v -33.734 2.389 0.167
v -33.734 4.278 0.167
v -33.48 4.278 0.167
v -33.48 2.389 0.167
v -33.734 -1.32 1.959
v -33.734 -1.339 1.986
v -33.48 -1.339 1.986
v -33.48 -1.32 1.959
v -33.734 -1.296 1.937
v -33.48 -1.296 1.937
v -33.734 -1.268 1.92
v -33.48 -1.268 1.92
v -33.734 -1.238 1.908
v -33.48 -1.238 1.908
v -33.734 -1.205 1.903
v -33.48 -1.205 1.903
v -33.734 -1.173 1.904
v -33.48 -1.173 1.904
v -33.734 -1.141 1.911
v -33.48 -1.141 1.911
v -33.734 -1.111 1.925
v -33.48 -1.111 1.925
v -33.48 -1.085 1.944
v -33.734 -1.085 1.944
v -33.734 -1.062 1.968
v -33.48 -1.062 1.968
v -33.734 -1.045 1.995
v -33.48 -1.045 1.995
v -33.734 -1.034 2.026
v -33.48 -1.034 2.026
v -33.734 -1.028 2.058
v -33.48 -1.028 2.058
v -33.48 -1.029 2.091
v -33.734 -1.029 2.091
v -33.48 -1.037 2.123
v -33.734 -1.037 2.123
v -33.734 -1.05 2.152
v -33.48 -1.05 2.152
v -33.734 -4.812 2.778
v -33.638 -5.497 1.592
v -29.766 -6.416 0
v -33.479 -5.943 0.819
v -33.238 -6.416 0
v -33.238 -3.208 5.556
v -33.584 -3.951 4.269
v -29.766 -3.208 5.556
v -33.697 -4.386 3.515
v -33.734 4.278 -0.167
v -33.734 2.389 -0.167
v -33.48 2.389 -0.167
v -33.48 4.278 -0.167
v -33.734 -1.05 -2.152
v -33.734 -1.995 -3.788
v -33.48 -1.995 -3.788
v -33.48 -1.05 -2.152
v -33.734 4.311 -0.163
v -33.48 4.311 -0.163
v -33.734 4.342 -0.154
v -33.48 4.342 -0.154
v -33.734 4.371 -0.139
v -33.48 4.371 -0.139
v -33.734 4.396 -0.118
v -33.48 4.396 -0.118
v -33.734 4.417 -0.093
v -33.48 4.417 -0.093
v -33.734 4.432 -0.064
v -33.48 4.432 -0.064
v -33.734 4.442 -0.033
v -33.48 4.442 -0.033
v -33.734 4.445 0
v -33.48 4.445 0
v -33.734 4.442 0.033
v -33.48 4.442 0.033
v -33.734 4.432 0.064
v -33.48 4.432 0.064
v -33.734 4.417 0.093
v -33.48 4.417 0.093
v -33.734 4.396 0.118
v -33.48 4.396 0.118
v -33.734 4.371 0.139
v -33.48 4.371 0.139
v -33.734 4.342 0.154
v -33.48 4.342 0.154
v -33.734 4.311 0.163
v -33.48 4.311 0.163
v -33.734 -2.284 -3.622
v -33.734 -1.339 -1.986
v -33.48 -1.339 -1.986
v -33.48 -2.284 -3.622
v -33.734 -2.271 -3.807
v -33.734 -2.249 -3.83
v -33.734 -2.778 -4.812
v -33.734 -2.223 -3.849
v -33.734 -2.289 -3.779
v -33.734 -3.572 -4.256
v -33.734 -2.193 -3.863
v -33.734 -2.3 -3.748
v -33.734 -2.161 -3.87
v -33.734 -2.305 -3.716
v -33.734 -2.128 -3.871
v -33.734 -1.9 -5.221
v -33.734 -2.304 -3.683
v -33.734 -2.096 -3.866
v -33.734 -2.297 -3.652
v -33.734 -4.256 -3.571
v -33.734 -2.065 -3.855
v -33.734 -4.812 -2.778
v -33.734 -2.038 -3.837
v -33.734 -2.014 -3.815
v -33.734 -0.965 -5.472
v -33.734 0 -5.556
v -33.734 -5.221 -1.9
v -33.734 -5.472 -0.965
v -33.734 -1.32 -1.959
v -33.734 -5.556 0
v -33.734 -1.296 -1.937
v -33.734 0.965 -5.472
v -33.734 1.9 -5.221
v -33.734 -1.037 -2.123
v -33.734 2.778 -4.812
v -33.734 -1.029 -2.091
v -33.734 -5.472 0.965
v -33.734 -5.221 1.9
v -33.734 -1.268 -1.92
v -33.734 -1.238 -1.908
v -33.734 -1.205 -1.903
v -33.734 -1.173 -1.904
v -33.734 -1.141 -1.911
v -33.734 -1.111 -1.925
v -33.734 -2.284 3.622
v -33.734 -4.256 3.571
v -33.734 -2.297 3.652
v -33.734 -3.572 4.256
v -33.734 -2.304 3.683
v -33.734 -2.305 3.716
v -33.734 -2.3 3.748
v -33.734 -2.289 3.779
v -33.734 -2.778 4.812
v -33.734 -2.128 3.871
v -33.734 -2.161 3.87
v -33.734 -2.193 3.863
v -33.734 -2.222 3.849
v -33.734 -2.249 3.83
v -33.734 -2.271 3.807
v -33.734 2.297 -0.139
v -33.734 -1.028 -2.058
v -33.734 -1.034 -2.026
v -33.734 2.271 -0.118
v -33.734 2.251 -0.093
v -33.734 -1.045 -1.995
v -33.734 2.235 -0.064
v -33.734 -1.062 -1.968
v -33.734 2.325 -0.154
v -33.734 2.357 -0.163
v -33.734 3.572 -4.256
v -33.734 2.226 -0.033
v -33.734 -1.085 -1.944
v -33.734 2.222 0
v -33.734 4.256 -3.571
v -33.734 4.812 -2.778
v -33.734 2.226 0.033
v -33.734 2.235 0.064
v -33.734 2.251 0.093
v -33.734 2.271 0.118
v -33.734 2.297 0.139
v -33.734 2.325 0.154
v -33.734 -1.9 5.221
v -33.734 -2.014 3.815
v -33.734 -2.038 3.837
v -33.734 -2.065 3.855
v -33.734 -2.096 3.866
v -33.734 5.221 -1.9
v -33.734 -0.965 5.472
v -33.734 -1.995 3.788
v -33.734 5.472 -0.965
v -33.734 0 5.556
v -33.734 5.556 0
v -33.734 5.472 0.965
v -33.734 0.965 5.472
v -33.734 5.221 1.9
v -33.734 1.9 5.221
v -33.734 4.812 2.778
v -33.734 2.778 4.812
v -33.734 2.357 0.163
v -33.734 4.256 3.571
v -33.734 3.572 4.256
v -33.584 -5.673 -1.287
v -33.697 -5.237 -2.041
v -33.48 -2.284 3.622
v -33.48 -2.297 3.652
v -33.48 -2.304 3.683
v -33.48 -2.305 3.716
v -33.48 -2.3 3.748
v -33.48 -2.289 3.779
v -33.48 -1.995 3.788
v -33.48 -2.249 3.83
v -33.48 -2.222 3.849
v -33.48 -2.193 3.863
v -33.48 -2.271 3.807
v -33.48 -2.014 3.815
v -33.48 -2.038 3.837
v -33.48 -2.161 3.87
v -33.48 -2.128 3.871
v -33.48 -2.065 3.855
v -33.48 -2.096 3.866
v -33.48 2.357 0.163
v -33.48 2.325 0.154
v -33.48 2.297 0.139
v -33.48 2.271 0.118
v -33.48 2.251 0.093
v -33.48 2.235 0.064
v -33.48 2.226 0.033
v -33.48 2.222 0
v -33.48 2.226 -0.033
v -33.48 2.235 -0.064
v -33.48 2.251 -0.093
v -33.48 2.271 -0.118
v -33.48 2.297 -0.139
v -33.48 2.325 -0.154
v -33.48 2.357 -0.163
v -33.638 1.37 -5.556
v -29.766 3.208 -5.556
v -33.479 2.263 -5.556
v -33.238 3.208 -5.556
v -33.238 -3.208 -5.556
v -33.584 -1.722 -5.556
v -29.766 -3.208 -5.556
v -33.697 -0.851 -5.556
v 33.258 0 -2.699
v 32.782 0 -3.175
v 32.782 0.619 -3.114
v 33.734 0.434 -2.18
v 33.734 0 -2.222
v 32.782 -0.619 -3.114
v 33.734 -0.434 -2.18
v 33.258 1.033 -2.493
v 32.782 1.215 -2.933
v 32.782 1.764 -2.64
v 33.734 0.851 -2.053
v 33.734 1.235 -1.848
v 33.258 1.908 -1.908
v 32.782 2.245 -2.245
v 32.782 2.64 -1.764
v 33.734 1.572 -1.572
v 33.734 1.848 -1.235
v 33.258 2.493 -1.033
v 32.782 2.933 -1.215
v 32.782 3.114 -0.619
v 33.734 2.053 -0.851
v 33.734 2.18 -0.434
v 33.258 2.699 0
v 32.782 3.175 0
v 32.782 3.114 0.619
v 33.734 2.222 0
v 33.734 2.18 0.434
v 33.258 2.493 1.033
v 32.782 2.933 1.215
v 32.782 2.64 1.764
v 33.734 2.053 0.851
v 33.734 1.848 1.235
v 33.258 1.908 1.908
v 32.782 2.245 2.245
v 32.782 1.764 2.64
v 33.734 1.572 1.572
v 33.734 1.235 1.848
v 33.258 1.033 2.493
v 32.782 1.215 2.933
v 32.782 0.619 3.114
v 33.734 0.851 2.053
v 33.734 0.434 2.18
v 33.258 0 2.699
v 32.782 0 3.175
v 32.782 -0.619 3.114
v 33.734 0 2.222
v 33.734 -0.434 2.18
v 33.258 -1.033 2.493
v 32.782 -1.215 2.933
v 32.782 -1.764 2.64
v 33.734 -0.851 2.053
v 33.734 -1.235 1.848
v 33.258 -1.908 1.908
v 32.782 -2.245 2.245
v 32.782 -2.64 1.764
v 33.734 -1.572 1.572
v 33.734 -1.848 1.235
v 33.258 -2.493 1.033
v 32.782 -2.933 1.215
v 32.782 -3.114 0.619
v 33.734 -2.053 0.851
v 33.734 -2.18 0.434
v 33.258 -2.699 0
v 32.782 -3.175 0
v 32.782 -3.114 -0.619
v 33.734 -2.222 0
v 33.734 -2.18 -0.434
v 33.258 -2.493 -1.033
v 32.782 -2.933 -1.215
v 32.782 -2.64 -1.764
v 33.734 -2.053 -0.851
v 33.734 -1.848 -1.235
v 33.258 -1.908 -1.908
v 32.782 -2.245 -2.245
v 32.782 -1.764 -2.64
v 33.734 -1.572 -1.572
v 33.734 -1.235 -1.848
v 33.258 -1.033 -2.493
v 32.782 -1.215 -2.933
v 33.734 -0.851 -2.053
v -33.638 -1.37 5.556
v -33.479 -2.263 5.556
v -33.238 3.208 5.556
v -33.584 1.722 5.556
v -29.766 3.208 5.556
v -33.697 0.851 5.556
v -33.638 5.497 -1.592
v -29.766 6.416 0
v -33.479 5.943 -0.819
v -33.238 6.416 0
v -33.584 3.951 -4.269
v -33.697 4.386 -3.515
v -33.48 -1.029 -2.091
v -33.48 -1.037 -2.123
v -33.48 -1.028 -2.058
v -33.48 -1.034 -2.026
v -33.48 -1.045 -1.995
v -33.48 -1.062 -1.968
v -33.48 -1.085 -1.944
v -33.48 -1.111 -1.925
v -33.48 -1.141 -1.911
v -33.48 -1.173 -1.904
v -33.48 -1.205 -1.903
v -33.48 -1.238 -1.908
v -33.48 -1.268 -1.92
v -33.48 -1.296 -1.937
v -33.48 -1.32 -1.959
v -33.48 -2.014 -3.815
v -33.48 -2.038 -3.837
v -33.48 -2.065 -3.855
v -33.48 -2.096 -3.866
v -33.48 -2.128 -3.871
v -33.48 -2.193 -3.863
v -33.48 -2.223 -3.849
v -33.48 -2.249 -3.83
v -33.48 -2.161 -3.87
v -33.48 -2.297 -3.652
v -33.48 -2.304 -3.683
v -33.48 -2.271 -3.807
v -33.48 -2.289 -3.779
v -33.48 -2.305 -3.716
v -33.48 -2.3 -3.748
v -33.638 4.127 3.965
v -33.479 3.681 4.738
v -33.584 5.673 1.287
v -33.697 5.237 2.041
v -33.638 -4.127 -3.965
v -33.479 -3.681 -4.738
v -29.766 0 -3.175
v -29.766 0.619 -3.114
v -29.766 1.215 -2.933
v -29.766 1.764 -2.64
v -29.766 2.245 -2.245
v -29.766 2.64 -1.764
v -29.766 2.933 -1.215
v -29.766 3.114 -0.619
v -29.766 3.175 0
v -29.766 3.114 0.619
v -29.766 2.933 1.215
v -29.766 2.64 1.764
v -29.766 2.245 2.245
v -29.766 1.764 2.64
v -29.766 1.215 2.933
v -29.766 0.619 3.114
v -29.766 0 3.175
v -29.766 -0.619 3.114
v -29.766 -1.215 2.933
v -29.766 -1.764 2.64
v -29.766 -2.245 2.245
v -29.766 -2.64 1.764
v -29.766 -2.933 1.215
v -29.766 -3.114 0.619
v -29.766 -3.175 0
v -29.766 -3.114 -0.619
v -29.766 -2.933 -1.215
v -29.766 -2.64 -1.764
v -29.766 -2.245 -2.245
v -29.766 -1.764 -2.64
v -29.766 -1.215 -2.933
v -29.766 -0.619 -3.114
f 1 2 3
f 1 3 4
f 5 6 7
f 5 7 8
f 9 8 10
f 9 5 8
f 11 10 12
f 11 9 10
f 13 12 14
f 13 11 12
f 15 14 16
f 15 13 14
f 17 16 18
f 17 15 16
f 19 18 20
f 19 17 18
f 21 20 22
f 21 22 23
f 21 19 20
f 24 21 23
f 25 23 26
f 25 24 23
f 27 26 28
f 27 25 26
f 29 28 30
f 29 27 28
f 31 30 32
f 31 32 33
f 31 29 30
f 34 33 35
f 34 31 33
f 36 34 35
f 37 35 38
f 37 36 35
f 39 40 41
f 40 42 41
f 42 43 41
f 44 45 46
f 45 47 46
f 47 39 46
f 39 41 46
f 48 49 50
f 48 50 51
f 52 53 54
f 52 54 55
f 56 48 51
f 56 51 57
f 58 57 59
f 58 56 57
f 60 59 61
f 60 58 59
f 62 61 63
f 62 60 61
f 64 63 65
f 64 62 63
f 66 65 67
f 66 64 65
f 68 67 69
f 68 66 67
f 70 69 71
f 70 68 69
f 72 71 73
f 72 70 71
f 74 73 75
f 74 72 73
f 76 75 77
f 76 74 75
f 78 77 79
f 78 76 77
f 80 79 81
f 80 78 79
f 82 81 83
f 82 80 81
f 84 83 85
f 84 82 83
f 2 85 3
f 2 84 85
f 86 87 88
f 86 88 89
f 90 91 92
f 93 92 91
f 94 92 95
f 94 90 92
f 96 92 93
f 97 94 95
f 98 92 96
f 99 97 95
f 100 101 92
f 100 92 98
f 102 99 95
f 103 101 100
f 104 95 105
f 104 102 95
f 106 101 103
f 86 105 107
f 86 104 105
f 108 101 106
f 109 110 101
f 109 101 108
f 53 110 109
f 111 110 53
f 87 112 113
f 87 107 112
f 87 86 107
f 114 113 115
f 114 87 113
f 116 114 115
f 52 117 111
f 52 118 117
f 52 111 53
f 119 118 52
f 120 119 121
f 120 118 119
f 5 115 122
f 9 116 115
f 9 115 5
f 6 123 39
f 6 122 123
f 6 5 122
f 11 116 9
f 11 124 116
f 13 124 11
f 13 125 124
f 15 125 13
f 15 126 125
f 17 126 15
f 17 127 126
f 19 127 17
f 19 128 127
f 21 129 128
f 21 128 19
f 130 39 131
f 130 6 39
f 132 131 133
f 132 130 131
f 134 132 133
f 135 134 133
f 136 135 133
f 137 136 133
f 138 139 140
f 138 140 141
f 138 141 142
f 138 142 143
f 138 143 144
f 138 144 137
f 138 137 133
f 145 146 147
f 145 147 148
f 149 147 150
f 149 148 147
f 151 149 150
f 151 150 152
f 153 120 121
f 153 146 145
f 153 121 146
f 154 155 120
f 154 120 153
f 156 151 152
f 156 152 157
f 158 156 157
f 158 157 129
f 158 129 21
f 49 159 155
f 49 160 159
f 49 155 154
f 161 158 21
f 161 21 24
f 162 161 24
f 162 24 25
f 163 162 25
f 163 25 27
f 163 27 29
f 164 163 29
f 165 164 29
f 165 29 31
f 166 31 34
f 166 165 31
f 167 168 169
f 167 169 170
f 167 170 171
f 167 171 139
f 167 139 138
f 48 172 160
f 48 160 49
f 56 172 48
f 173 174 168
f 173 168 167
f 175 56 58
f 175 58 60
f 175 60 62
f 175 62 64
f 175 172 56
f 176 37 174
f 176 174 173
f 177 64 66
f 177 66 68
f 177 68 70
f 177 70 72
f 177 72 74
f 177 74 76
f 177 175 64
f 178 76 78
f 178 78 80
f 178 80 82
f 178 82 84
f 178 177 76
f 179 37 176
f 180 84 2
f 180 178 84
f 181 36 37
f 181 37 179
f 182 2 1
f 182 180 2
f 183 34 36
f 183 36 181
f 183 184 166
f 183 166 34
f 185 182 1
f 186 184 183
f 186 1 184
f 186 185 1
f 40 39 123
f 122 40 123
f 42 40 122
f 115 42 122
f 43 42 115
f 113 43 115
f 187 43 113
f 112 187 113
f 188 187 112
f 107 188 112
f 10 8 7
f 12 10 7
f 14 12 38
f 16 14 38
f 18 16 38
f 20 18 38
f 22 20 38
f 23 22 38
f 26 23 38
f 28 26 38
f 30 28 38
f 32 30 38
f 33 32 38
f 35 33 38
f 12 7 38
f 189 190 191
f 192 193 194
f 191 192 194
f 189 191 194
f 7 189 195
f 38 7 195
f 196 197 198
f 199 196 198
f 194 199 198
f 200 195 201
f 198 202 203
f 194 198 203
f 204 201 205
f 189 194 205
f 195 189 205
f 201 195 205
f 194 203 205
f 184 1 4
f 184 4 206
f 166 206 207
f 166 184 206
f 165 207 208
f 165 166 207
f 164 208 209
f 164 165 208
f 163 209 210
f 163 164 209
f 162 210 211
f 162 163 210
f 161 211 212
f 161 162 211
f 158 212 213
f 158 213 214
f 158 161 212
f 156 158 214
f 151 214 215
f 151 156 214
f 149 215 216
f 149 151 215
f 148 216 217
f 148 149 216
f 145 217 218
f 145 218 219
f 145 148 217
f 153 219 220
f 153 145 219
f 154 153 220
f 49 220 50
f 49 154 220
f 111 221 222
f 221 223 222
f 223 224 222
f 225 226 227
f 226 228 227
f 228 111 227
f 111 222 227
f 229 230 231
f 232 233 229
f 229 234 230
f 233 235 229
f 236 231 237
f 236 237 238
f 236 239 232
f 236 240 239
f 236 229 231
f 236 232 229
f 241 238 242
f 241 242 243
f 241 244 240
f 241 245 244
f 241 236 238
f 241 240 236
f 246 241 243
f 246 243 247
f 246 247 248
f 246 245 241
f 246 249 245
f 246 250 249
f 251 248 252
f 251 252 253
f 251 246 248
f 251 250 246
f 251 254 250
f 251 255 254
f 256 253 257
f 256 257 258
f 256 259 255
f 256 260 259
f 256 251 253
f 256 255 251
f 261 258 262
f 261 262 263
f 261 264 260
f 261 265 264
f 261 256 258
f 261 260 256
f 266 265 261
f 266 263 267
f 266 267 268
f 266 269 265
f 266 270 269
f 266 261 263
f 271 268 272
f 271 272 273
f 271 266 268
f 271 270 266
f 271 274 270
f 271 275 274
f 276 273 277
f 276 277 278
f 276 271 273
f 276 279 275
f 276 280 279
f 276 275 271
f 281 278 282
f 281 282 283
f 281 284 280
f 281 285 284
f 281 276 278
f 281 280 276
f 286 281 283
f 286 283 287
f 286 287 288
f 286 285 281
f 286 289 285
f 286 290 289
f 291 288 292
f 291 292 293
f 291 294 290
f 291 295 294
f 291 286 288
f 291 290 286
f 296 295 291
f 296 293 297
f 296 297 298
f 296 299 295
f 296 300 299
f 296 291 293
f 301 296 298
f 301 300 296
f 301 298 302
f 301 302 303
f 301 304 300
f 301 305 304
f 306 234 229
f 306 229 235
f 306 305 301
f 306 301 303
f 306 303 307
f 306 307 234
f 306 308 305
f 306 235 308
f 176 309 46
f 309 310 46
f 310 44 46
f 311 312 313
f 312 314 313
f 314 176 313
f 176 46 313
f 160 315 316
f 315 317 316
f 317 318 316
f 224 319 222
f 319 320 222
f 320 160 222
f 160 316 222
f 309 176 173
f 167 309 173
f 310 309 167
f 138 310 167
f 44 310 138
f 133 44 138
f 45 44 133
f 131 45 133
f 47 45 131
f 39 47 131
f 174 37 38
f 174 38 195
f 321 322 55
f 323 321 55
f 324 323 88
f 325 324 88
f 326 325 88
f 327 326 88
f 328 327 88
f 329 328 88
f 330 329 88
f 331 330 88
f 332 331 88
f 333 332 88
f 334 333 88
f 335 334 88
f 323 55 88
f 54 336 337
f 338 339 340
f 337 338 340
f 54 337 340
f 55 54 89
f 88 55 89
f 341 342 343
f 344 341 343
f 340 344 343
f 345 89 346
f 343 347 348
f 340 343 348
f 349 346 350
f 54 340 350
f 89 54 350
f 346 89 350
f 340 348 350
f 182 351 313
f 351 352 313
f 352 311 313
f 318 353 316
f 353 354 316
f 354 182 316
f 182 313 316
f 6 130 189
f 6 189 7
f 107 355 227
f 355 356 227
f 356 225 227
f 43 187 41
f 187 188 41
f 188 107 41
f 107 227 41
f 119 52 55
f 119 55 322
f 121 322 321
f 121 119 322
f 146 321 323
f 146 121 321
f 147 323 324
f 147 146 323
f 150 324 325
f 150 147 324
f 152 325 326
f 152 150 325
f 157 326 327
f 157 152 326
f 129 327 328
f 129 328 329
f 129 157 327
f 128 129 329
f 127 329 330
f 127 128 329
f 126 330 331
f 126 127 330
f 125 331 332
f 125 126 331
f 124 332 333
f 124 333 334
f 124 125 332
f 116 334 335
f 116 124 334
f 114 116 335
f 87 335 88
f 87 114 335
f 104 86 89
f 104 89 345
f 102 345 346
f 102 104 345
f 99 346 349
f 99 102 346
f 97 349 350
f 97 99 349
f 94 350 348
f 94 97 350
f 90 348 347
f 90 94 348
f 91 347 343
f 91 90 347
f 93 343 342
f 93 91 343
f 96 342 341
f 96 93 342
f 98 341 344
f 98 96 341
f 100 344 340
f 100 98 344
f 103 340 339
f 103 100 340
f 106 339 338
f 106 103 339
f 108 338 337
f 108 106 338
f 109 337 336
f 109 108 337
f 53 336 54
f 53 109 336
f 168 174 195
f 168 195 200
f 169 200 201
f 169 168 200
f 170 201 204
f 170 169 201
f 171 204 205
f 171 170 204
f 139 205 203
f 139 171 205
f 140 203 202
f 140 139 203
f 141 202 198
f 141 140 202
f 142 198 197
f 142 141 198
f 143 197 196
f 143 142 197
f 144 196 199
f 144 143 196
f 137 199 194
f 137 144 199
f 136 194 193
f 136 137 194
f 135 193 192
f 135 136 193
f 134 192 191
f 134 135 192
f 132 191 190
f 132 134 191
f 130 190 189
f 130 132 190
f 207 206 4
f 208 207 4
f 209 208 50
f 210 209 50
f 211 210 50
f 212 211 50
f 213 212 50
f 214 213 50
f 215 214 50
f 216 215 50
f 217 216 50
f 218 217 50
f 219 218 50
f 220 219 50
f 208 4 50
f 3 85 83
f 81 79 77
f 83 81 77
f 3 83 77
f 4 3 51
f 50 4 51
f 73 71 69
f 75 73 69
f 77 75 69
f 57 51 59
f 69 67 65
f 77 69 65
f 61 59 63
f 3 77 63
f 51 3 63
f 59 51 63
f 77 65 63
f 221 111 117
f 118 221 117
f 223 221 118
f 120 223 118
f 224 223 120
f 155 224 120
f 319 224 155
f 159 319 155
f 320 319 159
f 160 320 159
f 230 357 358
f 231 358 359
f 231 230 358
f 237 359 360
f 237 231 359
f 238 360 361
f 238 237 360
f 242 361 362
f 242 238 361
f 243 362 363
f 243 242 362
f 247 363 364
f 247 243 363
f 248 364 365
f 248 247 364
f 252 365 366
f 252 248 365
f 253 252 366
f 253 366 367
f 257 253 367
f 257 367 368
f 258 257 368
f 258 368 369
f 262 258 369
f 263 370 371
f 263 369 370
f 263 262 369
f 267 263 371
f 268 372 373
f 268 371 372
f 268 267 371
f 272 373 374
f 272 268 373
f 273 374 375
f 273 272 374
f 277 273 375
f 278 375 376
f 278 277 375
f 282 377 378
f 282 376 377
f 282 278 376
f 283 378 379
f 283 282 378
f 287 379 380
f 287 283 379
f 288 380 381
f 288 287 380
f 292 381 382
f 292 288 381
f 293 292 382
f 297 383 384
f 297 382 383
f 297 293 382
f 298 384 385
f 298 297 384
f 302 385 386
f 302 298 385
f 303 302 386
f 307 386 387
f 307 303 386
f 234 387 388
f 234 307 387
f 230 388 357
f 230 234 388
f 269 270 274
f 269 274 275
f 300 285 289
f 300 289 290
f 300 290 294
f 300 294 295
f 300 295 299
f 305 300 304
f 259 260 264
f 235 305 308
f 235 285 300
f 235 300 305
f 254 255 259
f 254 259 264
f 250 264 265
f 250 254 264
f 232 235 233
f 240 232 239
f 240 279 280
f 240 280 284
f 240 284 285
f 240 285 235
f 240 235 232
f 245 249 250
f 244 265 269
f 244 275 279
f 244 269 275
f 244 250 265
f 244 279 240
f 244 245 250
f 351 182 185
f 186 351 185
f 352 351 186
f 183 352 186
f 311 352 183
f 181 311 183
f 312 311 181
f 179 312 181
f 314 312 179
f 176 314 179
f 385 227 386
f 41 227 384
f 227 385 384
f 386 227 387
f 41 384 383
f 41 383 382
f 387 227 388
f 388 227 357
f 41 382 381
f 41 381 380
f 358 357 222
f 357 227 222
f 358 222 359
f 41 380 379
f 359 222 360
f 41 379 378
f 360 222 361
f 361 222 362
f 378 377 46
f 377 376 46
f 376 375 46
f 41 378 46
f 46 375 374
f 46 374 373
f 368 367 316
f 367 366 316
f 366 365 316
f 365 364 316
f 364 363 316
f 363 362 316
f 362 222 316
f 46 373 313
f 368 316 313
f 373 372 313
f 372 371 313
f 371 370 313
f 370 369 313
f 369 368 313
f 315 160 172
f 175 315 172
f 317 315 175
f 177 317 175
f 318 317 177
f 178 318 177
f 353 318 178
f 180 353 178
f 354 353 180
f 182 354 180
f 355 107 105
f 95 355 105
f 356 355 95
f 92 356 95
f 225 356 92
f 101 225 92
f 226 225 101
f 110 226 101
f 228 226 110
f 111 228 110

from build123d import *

# Parameters (mm, degrees)
SKETCH5_R           = 3.175
BOSS_EXTRUDE3_DEPTH = 63.5
CHAMFER1_SIZE       = 0.9525
BOSS_EXTRUDE4_DEPTH = 3.96875
SKETCH8_OUTSIDE_W   = 264.208
SKETCH8_OUTSIDE_H   = 265.928
SKETCH8_OUTSIDE_R   = 5.55625
CUT_EXTRUDE3_DEPTH  = 68.46875
CUT_EXTRUDE3_TAPER  = 60
CUT_EXTRUDE4_DEPTH  = 0.254
CIRPATTERN1_COUNT   = 3


with BuildPart() as part:
    # Sketch5 → Boss-Extrude3 (new body)
    with BuildSketch(Plane(origin=(33.734375, 0, 0), x_dir=(0, 0, -1), z_dir=(1, 0, 0))):
        Circle(SKETCH5_R)
    extrude(amount=-BOSS_EXTRUDE3_DEPTH)

    # Chamfer1
    chamfer1_edges = [part.edges().sort_by_distance(p)[0] for p in [
        (33.734375, 0, 3.175),
    ]]
    chamfer(chamfer1_edges, length=CHAMFER1_SIZE)

    # Sketch11 → Revolve1 (revolve)
    with BuildSketch(Plane.XY):
        Polygon((-29.765625, 3.175), (-29.765625, 0), (17.859375, 0), (14.684375, 3.175), align=None)
    revolve(axis=Axis((-29.765625, 0, 0), (1, 0, 0)))

    # Sketch6 → Boss-Extrude4 (add)
    with BuildSketch(Plane.ZY.offset(29.765625)):
        Polygon((5.55625, 3.207902433), (0, 6.415804866), (-5.55625, 3.207902433), (-5.55625, -3.207902433), (0, -6.415804866), (5.55625, -3.207902433), align=None)
    extrude(amount=BOSS_EXTRUDE4_DEPTH)

    # Sketch8 outside → Cut-Extrude3 (cut, through all)
    with BuildSketch(Plane.ZY.offset(33.734375)):
        Rectangle(SKETCH8_OUTSIDE_W, SKETCH8_OUTSIDE_H)
        Circle(SKETCH8_OUTSIDE_R, mode=Mode.SUBTRACT)
    extrude(amount=-CUT_EXTRUDE3_DEPTH, taper=CUT_EXTRUDE3_TAPER, mode=Mode.SUBTRACT)

    # Sketch12 → Cut-Extrude4 (cut)
    with BuildSketch(Plane.ZY.offset(33.734375)):
        with BuildLine():
            Line((0.1666875, 4.2783125), (0.1666875, 2.3891875))
            ThreePointArc((0.1666875, 2.3891875), (0, 2.2225), (-0.1666875, 2.3891875))
            Line((-0.1666875, 2.3891875), (-0.1666875, 4.2783125))
            ThreePointArc((-0.1666875, 4.2783125), (0, 4.445), (0.1666875, 4.2783125))
        make_face()
    cut_extrude4 = extrude(amount=-CUT_EXTRUDE4_DEPTH, mode=Mode.SUBTRACT)

    # CirPattern1: Cut-Extrude4 ×3 about axis
    cirpattern1_axis = Axis((0, 0, 0), (1, 0, 0))
    for i in range(1, CIRPATTERN1_COUNT):
        add(cut_extrude4.rotate(cirpattern1_axis, i * 360 / CIRPATTERN1_COUNT), mode=Mode.SUBTRACT)


solid = part.part
